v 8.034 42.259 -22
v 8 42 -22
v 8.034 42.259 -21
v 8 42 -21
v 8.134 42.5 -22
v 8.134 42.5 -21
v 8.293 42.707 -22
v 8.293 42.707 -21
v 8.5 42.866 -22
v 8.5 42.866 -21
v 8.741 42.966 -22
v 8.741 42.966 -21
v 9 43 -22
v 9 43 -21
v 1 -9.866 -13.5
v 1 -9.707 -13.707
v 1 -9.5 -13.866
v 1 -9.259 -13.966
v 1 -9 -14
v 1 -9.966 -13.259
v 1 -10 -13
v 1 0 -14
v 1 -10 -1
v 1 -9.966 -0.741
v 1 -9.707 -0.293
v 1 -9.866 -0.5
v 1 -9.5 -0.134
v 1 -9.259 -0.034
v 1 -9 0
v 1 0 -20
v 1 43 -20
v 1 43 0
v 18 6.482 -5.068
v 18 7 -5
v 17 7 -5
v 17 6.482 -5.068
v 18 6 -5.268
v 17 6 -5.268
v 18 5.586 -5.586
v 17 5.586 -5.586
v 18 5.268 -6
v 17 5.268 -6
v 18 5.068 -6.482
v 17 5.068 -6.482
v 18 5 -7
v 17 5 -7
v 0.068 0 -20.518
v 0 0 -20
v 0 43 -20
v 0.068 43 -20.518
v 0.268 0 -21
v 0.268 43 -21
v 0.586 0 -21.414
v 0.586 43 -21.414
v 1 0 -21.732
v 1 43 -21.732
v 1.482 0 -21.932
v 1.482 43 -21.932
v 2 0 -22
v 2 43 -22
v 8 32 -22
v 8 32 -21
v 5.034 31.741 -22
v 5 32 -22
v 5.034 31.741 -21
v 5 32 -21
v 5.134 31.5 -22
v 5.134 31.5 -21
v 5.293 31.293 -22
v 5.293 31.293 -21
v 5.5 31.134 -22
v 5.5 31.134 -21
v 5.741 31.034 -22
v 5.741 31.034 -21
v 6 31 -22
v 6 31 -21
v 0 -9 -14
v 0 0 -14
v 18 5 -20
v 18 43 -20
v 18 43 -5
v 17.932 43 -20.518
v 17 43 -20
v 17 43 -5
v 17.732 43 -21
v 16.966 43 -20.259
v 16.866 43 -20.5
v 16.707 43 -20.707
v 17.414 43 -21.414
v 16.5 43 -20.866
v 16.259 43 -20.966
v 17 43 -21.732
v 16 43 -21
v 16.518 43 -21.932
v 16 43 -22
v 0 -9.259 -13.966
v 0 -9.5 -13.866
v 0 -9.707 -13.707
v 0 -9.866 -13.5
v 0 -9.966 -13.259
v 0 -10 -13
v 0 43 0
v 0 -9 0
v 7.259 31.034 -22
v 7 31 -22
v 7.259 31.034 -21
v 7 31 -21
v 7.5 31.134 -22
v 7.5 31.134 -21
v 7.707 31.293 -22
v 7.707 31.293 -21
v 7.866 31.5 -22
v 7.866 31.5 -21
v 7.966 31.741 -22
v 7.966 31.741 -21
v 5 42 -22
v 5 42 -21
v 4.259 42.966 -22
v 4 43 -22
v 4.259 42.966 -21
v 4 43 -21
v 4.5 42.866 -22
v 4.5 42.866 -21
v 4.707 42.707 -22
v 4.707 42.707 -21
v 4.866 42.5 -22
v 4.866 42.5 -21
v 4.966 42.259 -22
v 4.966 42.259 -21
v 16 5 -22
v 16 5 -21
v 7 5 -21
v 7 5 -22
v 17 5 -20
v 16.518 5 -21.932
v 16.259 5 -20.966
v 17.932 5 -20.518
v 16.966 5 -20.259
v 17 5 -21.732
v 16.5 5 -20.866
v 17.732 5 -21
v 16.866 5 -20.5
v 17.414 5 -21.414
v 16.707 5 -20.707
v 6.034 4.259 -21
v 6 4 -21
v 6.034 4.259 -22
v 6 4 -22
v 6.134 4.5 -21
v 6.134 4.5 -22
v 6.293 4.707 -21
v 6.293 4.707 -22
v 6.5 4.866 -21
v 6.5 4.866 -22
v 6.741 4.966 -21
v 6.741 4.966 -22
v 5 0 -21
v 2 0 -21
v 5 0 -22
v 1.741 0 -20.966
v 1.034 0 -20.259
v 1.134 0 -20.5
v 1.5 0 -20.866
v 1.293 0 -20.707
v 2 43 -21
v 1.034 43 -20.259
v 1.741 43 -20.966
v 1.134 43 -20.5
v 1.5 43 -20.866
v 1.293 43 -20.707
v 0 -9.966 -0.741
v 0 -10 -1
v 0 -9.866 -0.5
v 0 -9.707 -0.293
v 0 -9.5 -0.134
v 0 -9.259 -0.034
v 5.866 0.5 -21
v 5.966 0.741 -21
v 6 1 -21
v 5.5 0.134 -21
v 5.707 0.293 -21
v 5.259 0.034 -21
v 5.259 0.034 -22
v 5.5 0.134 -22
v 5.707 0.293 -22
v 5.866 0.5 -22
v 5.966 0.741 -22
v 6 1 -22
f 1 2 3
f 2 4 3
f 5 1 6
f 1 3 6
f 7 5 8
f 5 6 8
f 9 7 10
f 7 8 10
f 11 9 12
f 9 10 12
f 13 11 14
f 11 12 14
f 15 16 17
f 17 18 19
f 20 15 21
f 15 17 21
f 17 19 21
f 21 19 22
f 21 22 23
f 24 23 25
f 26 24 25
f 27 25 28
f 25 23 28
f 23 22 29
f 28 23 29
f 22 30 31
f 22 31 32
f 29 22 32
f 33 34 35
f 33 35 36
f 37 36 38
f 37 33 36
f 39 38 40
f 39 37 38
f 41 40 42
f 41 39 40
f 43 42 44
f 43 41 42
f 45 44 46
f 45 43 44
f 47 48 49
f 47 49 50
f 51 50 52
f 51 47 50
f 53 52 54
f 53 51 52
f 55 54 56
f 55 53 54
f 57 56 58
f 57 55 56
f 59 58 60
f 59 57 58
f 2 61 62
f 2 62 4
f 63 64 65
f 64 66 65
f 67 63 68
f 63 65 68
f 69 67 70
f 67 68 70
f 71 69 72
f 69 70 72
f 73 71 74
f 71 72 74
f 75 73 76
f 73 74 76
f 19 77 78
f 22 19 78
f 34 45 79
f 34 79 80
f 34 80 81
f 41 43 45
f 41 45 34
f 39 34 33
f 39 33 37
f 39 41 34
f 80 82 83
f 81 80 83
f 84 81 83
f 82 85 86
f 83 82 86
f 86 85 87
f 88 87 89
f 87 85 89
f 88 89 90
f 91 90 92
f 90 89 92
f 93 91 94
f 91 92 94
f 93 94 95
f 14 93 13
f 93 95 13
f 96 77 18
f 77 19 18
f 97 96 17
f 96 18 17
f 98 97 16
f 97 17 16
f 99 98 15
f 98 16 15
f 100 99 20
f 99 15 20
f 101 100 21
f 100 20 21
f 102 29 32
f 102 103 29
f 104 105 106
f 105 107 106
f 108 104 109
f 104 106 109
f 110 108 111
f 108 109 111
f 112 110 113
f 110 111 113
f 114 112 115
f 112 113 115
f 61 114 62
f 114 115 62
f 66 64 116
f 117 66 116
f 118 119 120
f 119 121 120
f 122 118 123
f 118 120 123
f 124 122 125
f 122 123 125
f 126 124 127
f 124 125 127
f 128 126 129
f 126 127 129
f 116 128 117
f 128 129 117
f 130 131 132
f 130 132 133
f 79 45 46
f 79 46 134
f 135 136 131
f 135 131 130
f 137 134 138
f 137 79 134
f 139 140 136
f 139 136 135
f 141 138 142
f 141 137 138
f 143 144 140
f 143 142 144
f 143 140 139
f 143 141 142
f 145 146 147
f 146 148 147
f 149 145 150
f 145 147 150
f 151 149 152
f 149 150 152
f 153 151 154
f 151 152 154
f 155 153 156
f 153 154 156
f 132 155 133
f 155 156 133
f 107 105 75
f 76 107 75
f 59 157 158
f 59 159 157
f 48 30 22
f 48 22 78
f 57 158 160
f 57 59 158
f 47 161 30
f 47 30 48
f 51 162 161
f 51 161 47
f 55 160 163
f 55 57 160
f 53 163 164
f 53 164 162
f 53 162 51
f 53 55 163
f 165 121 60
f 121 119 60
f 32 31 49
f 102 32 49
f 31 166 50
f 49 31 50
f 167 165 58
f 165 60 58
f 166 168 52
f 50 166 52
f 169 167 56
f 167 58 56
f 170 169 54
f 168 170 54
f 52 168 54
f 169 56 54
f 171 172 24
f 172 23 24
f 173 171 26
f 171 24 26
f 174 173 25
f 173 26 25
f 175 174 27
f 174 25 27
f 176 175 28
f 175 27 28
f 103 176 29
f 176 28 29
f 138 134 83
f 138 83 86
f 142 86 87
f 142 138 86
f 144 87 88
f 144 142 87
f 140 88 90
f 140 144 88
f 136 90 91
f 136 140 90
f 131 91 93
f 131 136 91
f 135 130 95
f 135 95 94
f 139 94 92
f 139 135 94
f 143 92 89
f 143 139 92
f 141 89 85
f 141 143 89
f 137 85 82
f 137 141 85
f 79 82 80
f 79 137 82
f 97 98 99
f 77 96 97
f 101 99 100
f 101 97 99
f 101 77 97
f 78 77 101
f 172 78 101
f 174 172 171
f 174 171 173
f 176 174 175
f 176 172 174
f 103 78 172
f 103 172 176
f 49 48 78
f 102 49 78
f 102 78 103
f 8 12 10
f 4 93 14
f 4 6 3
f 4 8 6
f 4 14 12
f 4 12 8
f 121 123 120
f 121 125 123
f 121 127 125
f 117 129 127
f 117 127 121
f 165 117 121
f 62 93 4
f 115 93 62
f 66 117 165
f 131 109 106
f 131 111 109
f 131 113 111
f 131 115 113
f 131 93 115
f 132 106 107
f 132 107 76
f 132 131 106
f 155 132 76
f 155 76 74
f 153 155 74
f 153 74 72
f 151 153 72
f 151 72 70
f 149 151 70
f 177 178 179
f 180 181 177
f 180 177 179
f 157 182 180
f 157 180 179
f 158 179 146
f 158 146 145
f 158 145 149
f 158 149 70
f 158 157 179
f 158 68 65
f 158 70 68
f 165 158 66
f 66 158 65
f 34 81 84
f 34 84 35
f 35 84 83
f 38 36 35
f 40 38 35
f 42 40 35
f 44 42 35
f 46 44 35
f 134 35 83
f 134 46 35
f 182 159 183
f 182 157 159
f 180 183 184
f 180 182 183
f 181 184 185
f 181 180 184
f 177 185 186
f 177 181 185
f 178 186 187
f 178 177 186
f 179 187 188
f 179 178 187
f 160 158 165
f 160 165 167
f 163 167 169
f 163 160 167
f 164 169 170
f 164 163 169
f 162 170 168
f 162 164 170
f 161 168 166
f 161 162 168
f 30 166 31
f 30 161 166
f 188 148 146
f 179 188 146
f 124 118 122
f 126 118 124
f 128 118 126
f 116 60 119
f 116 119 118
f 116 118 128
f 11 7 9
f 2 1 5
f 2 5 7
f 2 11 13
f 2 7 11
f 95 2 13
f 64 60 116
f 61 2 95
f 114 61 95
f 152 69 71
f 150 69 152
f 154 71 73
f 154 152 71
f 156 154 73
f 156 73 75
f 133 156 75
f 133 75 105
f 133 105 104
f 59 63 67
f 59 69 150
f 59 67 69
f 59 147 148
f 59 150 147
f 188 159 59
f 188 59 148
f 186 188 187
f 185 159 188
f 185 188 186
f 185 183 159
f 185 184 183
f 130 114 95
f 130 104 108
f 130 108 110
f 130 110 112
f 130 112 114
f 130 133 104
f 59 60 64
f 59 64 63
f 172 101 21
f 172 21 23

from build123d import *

# Parameters (mm, degrees)
SM_BASE_FLANGE_1_DEPTH   = 43
SKETCH_6_W               = 14
SKETCH_6_H               = 10
SM_BASE_FLANGE_1_2_DEPTH = 1
SKETCH_9_W               = 3
SKETCH_9_H               = 12
CUT_EXTRUDE_1_DEPTH      = 10
CUT_EXTRUDE_2_DEPTH      = 12
FILLET_1_R               = 1


# Sheet-metal steps are written as plain solids
with BuildPart() as part:
    # Sketch 1 → Sm Base Flange 1 (new body)
    with BuildSketch(Plane(origin=(0, 0, 0), x_dir=(1, 0, 0), z_dir=(0, 1, 0))):
        with BuildLine():
            Line((0, 0), (0, 20))
            ThreePointArc((0, 20), (0.585786438, 21.414213562), (2, 22))
            Line((2, 22), (16, 22))
            ThreePointArc((16, 22), (17.414213562, 21.414213562), (18, 20))
            Line((18, 20), (18, 0))
            Line((18, 0), (17, 0))
            Line((17, 0), (17, 20))
            ThreePointArc((17, 20), (16.707106781, 20.707106781), (16, 21))
            Line((16, 21), (2, 21))
            ThreePointArc((2, 21), (1.292893219, 20.707106781), (1, 20))
            Line((1, 20), (1, 0))
            Line((1, 0), (0, 0))
        make_face()
    extrude(amount=SM_BASE_FLANGE_1_DEPTH)

    # Эскиз6 → Sm Base Flange 1 2 (add)
    with BuildSketch(Plane.ZY):
        with Locations((-7, -5)):
            Rectangle(SKETCH_6_W, SKETCH_6_H)
    extrude(amount=-SM_BASE_FLANGE_1_2_DEPTH)

    # Эскиз9 → Вырез-Вытянуть1 (cut)
    with BuildSketch(Plane(origin=(0, 0, -22), x_dir=(-1, 0, 0), z_dir=(0, 0, -1))):
        with Locations((-6.5, 37)):
            Rectangle(SKETCH_9_W, SKETCH_9_H)
    extrude(amount=-CUT_EXTRUDE_1_DEPTH, mode=Mode.SUBTRACT)

    # Эскиз10 → Вырез-Вытянуть2 (cut)
    with BuildSketch(Plane(origin=(18, 0, 0), x_dir=(0, 0, -1), z_dir=(1, 0, 0))):
        with BuildLine():
            Line((0, 43), (5, 43))
            Line((5, 43), (5, 7))
            ThreePointArc((5, 7), (5.585786438, 5.585786438), (7, 5))
            Line((7, 5), (22, 5))
            Line((22, 5), (22, 0))
            Line((22, 0), (0, 0))
            Line((0, 0), (0, 43))
        make_face()
    extrude(amount=-CUT_EXTRUDE_2_DEPTH, mode=Mode.SUBTRACT)

    # Скругление1
    fillet_1_edges = [part.edges().sort_by_distance(p)[0] for p in [
        (6, 0, -21.5),
        (6, 5, -21.5),
        (0.5, -10, 0),
        (0.5, -10, -14),
        (5, 43, -21.5),
        (5, 31, -21.5),
        (8, 31, -21.5),
        (8, 43, -21.5),
    ]]
    fillet(fillet_1_edges, radius=FILLET_1_R)


solid = part.part
